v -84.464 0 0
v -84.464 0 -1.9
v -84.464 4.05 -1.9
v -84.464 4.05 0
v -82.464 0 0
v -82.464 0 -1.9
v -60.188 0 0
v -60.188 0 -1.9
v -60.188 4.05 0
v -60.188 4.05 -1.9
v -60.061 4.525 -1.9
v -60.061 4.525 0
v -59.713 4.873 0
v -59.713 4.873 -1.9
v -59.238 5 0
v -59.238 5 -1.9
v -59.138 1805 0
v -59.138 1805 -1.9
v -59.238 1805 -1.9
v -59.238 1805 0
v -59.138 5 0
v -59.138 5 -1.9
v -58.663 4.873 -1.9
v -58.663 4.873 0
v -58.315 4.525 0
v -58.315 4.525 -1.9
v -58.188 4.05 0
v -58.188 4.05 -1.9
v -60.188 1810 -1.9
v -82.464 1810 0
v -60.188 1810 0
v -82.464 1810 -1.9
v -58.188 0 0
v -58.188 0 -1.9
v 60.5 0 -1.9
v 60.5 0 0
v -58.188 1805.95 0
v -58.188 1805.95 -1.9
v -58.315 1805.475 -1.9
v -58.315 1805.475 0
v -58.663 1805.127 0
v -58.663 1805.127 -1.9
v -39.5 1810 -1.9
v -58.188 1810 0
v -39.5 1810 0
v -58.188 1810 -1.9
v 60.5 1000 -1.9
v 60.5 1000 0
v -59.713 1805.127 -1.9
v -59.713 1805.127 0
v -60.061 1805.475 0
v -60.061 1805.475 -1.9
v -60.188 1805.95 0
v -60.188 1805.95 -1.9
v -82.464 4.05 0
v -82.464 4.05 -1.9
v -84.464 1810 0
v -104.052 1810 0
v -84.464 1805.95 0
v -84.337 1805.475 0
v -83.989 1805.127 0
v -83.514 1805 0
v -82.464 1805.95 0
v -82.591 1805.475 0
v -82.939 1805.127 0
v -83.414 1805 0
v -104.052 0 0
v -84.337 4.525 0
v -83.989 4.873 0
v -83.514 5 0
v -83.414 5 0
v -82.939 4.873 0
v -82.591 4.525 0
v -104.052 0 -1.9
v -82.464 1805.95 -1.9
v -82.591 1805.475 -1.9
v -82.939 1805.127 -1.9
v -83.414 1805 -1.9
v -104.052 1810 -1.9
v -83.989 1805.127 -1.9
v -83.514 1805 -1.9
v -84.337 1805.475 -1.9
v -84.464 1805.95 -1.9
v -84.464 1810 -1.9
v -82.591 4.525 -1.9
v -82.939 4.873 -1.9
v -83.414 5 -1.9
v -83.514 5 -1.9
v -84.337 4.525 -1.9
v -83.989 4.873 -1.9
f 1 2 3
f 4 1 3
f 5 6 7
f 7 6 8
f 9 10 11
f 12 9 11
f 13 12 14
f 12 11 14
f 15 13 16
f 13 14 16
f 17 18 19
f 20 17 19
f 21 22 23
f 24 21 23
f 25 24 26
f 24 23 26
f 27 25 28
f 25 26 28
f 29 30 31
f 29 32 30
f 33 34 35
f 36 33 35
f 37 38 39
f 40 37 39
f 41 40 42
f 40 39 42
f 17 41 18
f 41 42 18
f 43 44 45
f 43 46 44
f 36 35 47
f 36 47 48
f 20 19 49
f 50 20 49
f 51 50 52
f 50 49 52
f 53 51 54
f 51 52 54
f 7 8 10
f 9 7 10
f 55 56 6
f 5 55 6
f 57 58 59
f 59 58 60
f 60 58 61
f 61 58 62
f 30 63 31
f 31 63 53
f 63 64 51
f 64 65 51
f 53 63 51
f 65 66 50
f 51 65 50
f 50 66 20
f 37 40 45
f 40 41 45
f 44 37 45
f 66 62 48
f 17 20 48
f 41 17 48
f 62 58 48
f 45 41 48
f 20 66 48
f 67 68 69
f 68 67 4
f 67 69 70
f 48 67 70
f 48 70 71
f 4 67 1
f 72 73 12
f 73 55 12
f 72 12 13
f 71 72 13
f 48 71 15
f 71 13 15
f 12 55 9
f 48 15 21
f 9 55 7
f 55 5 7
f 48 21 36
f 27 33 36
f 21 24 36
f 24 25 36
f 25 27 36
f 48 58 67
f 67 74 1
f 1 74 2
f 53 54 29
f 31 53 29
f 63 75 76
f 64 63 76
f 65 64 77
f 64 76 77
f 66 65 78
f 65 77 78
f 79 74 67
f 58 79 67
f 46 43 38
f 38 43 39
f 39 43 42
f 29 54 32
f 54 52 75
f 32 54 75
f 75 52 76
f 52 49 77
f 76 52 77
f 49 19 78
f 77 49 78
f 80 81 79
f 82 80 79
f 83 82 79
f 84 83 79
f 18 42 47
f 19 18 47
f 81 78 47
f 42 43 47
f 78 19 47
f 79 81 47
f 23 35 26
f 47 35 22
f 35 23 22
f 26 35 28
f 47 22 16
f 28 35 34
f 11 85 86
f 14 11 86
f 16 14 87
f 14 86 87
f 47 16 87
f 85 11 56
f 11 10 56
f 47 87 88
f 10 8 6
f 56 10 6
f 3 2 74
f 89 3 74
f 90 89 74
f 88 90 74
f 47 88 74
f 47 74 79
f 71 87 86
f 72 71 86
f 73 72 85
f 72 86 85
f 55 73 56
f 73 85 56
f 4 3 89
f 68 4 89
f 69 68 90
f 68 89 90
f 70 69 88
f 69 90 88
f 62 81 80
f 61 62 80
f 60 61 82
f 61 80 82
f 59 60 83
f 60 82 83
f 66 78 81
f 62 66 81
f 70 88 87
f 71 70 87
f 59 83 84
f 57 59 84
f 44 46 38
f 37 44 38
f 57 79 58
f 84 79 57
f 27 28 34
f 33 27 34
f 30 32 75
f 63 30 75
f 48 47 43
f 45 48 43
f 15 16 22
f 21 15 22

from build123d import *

# Parameters (mm, degrees)
BRIDA_BASE4_DEPTH          = 1810
CORTAR_EXTRUIR1_DEPTH      = 1812.988923807
CORTAR_EXTRUIR1_DEPTH_BACK = 1812.988923807
DESDOBLAR1_DEPTH           = 1810
DESDOBLAR1_2_DEPTH         = 1810
CORTAR_EXTRUIR2_DEPTH      = 1813.989374608
CORTAR_EXTRUIR2_DEPTH_BACK = 1813.989374608


# Read off the part's stored shape, not the designer's step: Desdoblar1
# Sheet-metal steps are written as plain solids
with BuildPart() as part:
    # Croquis1 → Brida base4 (new body)
    with BuildSketch(Plane(origin=(0, 0, 0), x_dir=(1, 0, 0), z_dir=(0, 1, 0))):
        with BuildLine():
            Line((60.5, 0), (-57.8634, 0))
            ThreePointArc((-57.8634, 0), (-59.727757739, 0.772242261), (-60.5, 2.6366))
            Line((-60.5, 2.6366), (-60.5, 24.2634))
            ThreePointArc((-60.5, 24.2634), (-60.715745145, 24.784254855), (-61.2366, 25))
            Line((-61.2366, 25), (-80.5, 25))
            Line((-80.5, 25), (-80.5, 26.9))
            Line((-80.5, 26.9), (-61.2366, 26.9))
            ThreePointArc((-61.2366, 26.9), (-59.372242261, 26.127757739), (-58.6, 24.2634))
            Line((-58.6, 24.2634), (-58.6, 2.6366))
            ThreePointArc((-58.6, 2.6366), (-58.384254855, 2.115745145), (-57.8634, 1.9))
            Line((-57.8634, 1.9), (60.5, 1.9))
            Line((60.5, 1.9), (60.5, 0))
        make_face()
    extrude(amount=BRIDA_BASE4_DEPTH)

    # Croquis19 → Cortar-Extruir1 (cut, two sides: drawn at the far end of the back side and taken through both)
    with BuildSketch(Plane.XY.offset(-CORTAR_EXTRUIR1_DEPTH_BACK)):
        Polygon((60.5, 1000), (-39.5, 1810), (-39.5, 1900.089959651), (60.5, 1900.089959651), align=None)
    extrude(amount=CORTAR_EXTRUIR1_DEPTH + CORTAR_EXTRUIR1_DEPTH_BACK, mode=Mode.SUBTRACT)

    # Desdoblar1 outline → Desdoblar1 (cut)
    with BuildSketch(Plane(origin=(0, 0, 0), x_dir=(1, 0, 0), z_dir=(0, 1, 0))):
        with BuildLine():
            ThreePointArc((-60.5, 2.6366), (-60.473622072, 2.264578098), (-60.395016084, 1.9))
            Line((-60.395016084, 1.9), (-57.8634, 1.9))
            ThreePointArc((-57.8634, 1.9), (-58.384254855, 2.115745145), (-58.6, 2.6366))
            Line((-58.6, 2.6366), (-58.6, 24.2634))
            ThreePointArc((-58.6, 24.2634), (-59.372242261, 26.127757739), (-61.2366, 26.9))
            Line((-61.2366, 26.9), (-80.5, 26.9))
            Line((-80.5, 26.9), (-80.5, 25))
            Line((-80.5, 25), (-61.2366, 25))
            ThreePointArc((-61.2366, 25), (-60.715745145, 24.784254855), (-60.5, 24.2634))
            Line((-60.5, 24.2634), (-60.5, 2.6366))
        make_face()
    extrude(amount=DESDOBLAR1_DEPTH, mode=Mode.SUBTRACT)

    # Desdoblar1 2 outline → Desdoblar1 2 (add)
    with BuildSketch(Plane(origin=(0, 0, 0), x_dir=(1, 0, 0), z_dir=(0, 1, 0))):
        with BuildLine():
            Line((-104.05221017, 0), (-57.8634, 0))
            ThreePointArc((-57.8634, 0), (-59.446046517, 0.527835063), (-60.395016084, 1.9))
            Line((-60.395016084, 1.9), (-104.05221017, 1.9))
            Line((-104.05221017, 1.9), (-104.05221017, 0))
        make_face()
    extrude(amount=DESDOBLAR1_2_DEPTH)

    # Croquis20 → Cortar-Extruir2 (cut, two sides: drawn at the far end of the back side and taken through both)
    with BuildSketch(Plane.XY.offset(-CORTAR_EXTRUIR2_DEPTH_BACK)):
        with BuildLine():
            ThreePointArc((-82.464157627, 1805.95), (-82.742406185, 1805.278248558), (-83.414157627, 1805))
            Line((-83.414157627, 1805), (-83.514157627, 1805))
            ThreePointArc((-83.514157627, 1805), (-84.185909069, 1805.278248558), (-84.464157627, 1805.95))
            Line((-84.464157627, 1805.95), (-84.464157627, 1810))
            Line((-84.464157627, 1810), (-82.464157627, 1810))
            Line((-82.464157627, 1810), (-82.464157627, 1805.95))
        make_face()
        with BuildLine():
            ThreePointArc((-58.188052542, 1805.95), (-58.4663011, 1805.278248558), (-59.138052542, 1805))
            Line((-59.138052542, 1805), (-59.238052542, 1805))
            ThreePointArc((-59.238052542, 1805), (-59.909803985, 1805.278248558), (-60.188052542, 1805.95))
            Line((-60.188052542, 1805.95), (-60.188052542, 1810))
            Line((-60.188052542, 1810), (-58.188052542, 1810))
            Line((-58.188052542, 1810), (-58.188052542, 1805.95))
        make_face()
        with BuildLine():
            ThreePointArc((-84.464157627, 4.05), (-84.185909069, 4.721751442), (-83.514157627, 5))
            Line((-83.514157627, 5), (-83.414157627, 5))
            ThreePointArc((-83.414157627, 5), (-82.742406185, 4.721751442), (-82.464157627, 4.05))
            Line((-82.464157627, 4.05), (-82.464157627, 0))
            Line((-82.464157627, 0), (-84.464157627, 0))
            Line((-84.464157627, 0), (-84.464157627, 4.05))
        make_face()
        with BuildLine():
            ThreePointArc((-60.188052542, 4.05), (-59.909803985, 4.721751442), (-59.238052542, 5))
            Line((-59.238052542, 5), (-59.138052542, 5))
            ThreePointArc((-59.138052542, 5), (-58.4663011, 4.721751442), (-58.188052542, 4.05))
            Line((-58.188052542, 4.05), (-58.188052542, 0))
            Line((-58.188052542, 0), (-60.188052542, 0))
            Line((-60.188052542, 0), (-60.188052542, 4.05))
        make_face()
    extrude(amount=CORTAR_EXTRUIR2_DEPTH + CORTAR_EXTRUIR2_DEPTH_BACK, mode=Mode.SUBTRACT)


solid = part.part
